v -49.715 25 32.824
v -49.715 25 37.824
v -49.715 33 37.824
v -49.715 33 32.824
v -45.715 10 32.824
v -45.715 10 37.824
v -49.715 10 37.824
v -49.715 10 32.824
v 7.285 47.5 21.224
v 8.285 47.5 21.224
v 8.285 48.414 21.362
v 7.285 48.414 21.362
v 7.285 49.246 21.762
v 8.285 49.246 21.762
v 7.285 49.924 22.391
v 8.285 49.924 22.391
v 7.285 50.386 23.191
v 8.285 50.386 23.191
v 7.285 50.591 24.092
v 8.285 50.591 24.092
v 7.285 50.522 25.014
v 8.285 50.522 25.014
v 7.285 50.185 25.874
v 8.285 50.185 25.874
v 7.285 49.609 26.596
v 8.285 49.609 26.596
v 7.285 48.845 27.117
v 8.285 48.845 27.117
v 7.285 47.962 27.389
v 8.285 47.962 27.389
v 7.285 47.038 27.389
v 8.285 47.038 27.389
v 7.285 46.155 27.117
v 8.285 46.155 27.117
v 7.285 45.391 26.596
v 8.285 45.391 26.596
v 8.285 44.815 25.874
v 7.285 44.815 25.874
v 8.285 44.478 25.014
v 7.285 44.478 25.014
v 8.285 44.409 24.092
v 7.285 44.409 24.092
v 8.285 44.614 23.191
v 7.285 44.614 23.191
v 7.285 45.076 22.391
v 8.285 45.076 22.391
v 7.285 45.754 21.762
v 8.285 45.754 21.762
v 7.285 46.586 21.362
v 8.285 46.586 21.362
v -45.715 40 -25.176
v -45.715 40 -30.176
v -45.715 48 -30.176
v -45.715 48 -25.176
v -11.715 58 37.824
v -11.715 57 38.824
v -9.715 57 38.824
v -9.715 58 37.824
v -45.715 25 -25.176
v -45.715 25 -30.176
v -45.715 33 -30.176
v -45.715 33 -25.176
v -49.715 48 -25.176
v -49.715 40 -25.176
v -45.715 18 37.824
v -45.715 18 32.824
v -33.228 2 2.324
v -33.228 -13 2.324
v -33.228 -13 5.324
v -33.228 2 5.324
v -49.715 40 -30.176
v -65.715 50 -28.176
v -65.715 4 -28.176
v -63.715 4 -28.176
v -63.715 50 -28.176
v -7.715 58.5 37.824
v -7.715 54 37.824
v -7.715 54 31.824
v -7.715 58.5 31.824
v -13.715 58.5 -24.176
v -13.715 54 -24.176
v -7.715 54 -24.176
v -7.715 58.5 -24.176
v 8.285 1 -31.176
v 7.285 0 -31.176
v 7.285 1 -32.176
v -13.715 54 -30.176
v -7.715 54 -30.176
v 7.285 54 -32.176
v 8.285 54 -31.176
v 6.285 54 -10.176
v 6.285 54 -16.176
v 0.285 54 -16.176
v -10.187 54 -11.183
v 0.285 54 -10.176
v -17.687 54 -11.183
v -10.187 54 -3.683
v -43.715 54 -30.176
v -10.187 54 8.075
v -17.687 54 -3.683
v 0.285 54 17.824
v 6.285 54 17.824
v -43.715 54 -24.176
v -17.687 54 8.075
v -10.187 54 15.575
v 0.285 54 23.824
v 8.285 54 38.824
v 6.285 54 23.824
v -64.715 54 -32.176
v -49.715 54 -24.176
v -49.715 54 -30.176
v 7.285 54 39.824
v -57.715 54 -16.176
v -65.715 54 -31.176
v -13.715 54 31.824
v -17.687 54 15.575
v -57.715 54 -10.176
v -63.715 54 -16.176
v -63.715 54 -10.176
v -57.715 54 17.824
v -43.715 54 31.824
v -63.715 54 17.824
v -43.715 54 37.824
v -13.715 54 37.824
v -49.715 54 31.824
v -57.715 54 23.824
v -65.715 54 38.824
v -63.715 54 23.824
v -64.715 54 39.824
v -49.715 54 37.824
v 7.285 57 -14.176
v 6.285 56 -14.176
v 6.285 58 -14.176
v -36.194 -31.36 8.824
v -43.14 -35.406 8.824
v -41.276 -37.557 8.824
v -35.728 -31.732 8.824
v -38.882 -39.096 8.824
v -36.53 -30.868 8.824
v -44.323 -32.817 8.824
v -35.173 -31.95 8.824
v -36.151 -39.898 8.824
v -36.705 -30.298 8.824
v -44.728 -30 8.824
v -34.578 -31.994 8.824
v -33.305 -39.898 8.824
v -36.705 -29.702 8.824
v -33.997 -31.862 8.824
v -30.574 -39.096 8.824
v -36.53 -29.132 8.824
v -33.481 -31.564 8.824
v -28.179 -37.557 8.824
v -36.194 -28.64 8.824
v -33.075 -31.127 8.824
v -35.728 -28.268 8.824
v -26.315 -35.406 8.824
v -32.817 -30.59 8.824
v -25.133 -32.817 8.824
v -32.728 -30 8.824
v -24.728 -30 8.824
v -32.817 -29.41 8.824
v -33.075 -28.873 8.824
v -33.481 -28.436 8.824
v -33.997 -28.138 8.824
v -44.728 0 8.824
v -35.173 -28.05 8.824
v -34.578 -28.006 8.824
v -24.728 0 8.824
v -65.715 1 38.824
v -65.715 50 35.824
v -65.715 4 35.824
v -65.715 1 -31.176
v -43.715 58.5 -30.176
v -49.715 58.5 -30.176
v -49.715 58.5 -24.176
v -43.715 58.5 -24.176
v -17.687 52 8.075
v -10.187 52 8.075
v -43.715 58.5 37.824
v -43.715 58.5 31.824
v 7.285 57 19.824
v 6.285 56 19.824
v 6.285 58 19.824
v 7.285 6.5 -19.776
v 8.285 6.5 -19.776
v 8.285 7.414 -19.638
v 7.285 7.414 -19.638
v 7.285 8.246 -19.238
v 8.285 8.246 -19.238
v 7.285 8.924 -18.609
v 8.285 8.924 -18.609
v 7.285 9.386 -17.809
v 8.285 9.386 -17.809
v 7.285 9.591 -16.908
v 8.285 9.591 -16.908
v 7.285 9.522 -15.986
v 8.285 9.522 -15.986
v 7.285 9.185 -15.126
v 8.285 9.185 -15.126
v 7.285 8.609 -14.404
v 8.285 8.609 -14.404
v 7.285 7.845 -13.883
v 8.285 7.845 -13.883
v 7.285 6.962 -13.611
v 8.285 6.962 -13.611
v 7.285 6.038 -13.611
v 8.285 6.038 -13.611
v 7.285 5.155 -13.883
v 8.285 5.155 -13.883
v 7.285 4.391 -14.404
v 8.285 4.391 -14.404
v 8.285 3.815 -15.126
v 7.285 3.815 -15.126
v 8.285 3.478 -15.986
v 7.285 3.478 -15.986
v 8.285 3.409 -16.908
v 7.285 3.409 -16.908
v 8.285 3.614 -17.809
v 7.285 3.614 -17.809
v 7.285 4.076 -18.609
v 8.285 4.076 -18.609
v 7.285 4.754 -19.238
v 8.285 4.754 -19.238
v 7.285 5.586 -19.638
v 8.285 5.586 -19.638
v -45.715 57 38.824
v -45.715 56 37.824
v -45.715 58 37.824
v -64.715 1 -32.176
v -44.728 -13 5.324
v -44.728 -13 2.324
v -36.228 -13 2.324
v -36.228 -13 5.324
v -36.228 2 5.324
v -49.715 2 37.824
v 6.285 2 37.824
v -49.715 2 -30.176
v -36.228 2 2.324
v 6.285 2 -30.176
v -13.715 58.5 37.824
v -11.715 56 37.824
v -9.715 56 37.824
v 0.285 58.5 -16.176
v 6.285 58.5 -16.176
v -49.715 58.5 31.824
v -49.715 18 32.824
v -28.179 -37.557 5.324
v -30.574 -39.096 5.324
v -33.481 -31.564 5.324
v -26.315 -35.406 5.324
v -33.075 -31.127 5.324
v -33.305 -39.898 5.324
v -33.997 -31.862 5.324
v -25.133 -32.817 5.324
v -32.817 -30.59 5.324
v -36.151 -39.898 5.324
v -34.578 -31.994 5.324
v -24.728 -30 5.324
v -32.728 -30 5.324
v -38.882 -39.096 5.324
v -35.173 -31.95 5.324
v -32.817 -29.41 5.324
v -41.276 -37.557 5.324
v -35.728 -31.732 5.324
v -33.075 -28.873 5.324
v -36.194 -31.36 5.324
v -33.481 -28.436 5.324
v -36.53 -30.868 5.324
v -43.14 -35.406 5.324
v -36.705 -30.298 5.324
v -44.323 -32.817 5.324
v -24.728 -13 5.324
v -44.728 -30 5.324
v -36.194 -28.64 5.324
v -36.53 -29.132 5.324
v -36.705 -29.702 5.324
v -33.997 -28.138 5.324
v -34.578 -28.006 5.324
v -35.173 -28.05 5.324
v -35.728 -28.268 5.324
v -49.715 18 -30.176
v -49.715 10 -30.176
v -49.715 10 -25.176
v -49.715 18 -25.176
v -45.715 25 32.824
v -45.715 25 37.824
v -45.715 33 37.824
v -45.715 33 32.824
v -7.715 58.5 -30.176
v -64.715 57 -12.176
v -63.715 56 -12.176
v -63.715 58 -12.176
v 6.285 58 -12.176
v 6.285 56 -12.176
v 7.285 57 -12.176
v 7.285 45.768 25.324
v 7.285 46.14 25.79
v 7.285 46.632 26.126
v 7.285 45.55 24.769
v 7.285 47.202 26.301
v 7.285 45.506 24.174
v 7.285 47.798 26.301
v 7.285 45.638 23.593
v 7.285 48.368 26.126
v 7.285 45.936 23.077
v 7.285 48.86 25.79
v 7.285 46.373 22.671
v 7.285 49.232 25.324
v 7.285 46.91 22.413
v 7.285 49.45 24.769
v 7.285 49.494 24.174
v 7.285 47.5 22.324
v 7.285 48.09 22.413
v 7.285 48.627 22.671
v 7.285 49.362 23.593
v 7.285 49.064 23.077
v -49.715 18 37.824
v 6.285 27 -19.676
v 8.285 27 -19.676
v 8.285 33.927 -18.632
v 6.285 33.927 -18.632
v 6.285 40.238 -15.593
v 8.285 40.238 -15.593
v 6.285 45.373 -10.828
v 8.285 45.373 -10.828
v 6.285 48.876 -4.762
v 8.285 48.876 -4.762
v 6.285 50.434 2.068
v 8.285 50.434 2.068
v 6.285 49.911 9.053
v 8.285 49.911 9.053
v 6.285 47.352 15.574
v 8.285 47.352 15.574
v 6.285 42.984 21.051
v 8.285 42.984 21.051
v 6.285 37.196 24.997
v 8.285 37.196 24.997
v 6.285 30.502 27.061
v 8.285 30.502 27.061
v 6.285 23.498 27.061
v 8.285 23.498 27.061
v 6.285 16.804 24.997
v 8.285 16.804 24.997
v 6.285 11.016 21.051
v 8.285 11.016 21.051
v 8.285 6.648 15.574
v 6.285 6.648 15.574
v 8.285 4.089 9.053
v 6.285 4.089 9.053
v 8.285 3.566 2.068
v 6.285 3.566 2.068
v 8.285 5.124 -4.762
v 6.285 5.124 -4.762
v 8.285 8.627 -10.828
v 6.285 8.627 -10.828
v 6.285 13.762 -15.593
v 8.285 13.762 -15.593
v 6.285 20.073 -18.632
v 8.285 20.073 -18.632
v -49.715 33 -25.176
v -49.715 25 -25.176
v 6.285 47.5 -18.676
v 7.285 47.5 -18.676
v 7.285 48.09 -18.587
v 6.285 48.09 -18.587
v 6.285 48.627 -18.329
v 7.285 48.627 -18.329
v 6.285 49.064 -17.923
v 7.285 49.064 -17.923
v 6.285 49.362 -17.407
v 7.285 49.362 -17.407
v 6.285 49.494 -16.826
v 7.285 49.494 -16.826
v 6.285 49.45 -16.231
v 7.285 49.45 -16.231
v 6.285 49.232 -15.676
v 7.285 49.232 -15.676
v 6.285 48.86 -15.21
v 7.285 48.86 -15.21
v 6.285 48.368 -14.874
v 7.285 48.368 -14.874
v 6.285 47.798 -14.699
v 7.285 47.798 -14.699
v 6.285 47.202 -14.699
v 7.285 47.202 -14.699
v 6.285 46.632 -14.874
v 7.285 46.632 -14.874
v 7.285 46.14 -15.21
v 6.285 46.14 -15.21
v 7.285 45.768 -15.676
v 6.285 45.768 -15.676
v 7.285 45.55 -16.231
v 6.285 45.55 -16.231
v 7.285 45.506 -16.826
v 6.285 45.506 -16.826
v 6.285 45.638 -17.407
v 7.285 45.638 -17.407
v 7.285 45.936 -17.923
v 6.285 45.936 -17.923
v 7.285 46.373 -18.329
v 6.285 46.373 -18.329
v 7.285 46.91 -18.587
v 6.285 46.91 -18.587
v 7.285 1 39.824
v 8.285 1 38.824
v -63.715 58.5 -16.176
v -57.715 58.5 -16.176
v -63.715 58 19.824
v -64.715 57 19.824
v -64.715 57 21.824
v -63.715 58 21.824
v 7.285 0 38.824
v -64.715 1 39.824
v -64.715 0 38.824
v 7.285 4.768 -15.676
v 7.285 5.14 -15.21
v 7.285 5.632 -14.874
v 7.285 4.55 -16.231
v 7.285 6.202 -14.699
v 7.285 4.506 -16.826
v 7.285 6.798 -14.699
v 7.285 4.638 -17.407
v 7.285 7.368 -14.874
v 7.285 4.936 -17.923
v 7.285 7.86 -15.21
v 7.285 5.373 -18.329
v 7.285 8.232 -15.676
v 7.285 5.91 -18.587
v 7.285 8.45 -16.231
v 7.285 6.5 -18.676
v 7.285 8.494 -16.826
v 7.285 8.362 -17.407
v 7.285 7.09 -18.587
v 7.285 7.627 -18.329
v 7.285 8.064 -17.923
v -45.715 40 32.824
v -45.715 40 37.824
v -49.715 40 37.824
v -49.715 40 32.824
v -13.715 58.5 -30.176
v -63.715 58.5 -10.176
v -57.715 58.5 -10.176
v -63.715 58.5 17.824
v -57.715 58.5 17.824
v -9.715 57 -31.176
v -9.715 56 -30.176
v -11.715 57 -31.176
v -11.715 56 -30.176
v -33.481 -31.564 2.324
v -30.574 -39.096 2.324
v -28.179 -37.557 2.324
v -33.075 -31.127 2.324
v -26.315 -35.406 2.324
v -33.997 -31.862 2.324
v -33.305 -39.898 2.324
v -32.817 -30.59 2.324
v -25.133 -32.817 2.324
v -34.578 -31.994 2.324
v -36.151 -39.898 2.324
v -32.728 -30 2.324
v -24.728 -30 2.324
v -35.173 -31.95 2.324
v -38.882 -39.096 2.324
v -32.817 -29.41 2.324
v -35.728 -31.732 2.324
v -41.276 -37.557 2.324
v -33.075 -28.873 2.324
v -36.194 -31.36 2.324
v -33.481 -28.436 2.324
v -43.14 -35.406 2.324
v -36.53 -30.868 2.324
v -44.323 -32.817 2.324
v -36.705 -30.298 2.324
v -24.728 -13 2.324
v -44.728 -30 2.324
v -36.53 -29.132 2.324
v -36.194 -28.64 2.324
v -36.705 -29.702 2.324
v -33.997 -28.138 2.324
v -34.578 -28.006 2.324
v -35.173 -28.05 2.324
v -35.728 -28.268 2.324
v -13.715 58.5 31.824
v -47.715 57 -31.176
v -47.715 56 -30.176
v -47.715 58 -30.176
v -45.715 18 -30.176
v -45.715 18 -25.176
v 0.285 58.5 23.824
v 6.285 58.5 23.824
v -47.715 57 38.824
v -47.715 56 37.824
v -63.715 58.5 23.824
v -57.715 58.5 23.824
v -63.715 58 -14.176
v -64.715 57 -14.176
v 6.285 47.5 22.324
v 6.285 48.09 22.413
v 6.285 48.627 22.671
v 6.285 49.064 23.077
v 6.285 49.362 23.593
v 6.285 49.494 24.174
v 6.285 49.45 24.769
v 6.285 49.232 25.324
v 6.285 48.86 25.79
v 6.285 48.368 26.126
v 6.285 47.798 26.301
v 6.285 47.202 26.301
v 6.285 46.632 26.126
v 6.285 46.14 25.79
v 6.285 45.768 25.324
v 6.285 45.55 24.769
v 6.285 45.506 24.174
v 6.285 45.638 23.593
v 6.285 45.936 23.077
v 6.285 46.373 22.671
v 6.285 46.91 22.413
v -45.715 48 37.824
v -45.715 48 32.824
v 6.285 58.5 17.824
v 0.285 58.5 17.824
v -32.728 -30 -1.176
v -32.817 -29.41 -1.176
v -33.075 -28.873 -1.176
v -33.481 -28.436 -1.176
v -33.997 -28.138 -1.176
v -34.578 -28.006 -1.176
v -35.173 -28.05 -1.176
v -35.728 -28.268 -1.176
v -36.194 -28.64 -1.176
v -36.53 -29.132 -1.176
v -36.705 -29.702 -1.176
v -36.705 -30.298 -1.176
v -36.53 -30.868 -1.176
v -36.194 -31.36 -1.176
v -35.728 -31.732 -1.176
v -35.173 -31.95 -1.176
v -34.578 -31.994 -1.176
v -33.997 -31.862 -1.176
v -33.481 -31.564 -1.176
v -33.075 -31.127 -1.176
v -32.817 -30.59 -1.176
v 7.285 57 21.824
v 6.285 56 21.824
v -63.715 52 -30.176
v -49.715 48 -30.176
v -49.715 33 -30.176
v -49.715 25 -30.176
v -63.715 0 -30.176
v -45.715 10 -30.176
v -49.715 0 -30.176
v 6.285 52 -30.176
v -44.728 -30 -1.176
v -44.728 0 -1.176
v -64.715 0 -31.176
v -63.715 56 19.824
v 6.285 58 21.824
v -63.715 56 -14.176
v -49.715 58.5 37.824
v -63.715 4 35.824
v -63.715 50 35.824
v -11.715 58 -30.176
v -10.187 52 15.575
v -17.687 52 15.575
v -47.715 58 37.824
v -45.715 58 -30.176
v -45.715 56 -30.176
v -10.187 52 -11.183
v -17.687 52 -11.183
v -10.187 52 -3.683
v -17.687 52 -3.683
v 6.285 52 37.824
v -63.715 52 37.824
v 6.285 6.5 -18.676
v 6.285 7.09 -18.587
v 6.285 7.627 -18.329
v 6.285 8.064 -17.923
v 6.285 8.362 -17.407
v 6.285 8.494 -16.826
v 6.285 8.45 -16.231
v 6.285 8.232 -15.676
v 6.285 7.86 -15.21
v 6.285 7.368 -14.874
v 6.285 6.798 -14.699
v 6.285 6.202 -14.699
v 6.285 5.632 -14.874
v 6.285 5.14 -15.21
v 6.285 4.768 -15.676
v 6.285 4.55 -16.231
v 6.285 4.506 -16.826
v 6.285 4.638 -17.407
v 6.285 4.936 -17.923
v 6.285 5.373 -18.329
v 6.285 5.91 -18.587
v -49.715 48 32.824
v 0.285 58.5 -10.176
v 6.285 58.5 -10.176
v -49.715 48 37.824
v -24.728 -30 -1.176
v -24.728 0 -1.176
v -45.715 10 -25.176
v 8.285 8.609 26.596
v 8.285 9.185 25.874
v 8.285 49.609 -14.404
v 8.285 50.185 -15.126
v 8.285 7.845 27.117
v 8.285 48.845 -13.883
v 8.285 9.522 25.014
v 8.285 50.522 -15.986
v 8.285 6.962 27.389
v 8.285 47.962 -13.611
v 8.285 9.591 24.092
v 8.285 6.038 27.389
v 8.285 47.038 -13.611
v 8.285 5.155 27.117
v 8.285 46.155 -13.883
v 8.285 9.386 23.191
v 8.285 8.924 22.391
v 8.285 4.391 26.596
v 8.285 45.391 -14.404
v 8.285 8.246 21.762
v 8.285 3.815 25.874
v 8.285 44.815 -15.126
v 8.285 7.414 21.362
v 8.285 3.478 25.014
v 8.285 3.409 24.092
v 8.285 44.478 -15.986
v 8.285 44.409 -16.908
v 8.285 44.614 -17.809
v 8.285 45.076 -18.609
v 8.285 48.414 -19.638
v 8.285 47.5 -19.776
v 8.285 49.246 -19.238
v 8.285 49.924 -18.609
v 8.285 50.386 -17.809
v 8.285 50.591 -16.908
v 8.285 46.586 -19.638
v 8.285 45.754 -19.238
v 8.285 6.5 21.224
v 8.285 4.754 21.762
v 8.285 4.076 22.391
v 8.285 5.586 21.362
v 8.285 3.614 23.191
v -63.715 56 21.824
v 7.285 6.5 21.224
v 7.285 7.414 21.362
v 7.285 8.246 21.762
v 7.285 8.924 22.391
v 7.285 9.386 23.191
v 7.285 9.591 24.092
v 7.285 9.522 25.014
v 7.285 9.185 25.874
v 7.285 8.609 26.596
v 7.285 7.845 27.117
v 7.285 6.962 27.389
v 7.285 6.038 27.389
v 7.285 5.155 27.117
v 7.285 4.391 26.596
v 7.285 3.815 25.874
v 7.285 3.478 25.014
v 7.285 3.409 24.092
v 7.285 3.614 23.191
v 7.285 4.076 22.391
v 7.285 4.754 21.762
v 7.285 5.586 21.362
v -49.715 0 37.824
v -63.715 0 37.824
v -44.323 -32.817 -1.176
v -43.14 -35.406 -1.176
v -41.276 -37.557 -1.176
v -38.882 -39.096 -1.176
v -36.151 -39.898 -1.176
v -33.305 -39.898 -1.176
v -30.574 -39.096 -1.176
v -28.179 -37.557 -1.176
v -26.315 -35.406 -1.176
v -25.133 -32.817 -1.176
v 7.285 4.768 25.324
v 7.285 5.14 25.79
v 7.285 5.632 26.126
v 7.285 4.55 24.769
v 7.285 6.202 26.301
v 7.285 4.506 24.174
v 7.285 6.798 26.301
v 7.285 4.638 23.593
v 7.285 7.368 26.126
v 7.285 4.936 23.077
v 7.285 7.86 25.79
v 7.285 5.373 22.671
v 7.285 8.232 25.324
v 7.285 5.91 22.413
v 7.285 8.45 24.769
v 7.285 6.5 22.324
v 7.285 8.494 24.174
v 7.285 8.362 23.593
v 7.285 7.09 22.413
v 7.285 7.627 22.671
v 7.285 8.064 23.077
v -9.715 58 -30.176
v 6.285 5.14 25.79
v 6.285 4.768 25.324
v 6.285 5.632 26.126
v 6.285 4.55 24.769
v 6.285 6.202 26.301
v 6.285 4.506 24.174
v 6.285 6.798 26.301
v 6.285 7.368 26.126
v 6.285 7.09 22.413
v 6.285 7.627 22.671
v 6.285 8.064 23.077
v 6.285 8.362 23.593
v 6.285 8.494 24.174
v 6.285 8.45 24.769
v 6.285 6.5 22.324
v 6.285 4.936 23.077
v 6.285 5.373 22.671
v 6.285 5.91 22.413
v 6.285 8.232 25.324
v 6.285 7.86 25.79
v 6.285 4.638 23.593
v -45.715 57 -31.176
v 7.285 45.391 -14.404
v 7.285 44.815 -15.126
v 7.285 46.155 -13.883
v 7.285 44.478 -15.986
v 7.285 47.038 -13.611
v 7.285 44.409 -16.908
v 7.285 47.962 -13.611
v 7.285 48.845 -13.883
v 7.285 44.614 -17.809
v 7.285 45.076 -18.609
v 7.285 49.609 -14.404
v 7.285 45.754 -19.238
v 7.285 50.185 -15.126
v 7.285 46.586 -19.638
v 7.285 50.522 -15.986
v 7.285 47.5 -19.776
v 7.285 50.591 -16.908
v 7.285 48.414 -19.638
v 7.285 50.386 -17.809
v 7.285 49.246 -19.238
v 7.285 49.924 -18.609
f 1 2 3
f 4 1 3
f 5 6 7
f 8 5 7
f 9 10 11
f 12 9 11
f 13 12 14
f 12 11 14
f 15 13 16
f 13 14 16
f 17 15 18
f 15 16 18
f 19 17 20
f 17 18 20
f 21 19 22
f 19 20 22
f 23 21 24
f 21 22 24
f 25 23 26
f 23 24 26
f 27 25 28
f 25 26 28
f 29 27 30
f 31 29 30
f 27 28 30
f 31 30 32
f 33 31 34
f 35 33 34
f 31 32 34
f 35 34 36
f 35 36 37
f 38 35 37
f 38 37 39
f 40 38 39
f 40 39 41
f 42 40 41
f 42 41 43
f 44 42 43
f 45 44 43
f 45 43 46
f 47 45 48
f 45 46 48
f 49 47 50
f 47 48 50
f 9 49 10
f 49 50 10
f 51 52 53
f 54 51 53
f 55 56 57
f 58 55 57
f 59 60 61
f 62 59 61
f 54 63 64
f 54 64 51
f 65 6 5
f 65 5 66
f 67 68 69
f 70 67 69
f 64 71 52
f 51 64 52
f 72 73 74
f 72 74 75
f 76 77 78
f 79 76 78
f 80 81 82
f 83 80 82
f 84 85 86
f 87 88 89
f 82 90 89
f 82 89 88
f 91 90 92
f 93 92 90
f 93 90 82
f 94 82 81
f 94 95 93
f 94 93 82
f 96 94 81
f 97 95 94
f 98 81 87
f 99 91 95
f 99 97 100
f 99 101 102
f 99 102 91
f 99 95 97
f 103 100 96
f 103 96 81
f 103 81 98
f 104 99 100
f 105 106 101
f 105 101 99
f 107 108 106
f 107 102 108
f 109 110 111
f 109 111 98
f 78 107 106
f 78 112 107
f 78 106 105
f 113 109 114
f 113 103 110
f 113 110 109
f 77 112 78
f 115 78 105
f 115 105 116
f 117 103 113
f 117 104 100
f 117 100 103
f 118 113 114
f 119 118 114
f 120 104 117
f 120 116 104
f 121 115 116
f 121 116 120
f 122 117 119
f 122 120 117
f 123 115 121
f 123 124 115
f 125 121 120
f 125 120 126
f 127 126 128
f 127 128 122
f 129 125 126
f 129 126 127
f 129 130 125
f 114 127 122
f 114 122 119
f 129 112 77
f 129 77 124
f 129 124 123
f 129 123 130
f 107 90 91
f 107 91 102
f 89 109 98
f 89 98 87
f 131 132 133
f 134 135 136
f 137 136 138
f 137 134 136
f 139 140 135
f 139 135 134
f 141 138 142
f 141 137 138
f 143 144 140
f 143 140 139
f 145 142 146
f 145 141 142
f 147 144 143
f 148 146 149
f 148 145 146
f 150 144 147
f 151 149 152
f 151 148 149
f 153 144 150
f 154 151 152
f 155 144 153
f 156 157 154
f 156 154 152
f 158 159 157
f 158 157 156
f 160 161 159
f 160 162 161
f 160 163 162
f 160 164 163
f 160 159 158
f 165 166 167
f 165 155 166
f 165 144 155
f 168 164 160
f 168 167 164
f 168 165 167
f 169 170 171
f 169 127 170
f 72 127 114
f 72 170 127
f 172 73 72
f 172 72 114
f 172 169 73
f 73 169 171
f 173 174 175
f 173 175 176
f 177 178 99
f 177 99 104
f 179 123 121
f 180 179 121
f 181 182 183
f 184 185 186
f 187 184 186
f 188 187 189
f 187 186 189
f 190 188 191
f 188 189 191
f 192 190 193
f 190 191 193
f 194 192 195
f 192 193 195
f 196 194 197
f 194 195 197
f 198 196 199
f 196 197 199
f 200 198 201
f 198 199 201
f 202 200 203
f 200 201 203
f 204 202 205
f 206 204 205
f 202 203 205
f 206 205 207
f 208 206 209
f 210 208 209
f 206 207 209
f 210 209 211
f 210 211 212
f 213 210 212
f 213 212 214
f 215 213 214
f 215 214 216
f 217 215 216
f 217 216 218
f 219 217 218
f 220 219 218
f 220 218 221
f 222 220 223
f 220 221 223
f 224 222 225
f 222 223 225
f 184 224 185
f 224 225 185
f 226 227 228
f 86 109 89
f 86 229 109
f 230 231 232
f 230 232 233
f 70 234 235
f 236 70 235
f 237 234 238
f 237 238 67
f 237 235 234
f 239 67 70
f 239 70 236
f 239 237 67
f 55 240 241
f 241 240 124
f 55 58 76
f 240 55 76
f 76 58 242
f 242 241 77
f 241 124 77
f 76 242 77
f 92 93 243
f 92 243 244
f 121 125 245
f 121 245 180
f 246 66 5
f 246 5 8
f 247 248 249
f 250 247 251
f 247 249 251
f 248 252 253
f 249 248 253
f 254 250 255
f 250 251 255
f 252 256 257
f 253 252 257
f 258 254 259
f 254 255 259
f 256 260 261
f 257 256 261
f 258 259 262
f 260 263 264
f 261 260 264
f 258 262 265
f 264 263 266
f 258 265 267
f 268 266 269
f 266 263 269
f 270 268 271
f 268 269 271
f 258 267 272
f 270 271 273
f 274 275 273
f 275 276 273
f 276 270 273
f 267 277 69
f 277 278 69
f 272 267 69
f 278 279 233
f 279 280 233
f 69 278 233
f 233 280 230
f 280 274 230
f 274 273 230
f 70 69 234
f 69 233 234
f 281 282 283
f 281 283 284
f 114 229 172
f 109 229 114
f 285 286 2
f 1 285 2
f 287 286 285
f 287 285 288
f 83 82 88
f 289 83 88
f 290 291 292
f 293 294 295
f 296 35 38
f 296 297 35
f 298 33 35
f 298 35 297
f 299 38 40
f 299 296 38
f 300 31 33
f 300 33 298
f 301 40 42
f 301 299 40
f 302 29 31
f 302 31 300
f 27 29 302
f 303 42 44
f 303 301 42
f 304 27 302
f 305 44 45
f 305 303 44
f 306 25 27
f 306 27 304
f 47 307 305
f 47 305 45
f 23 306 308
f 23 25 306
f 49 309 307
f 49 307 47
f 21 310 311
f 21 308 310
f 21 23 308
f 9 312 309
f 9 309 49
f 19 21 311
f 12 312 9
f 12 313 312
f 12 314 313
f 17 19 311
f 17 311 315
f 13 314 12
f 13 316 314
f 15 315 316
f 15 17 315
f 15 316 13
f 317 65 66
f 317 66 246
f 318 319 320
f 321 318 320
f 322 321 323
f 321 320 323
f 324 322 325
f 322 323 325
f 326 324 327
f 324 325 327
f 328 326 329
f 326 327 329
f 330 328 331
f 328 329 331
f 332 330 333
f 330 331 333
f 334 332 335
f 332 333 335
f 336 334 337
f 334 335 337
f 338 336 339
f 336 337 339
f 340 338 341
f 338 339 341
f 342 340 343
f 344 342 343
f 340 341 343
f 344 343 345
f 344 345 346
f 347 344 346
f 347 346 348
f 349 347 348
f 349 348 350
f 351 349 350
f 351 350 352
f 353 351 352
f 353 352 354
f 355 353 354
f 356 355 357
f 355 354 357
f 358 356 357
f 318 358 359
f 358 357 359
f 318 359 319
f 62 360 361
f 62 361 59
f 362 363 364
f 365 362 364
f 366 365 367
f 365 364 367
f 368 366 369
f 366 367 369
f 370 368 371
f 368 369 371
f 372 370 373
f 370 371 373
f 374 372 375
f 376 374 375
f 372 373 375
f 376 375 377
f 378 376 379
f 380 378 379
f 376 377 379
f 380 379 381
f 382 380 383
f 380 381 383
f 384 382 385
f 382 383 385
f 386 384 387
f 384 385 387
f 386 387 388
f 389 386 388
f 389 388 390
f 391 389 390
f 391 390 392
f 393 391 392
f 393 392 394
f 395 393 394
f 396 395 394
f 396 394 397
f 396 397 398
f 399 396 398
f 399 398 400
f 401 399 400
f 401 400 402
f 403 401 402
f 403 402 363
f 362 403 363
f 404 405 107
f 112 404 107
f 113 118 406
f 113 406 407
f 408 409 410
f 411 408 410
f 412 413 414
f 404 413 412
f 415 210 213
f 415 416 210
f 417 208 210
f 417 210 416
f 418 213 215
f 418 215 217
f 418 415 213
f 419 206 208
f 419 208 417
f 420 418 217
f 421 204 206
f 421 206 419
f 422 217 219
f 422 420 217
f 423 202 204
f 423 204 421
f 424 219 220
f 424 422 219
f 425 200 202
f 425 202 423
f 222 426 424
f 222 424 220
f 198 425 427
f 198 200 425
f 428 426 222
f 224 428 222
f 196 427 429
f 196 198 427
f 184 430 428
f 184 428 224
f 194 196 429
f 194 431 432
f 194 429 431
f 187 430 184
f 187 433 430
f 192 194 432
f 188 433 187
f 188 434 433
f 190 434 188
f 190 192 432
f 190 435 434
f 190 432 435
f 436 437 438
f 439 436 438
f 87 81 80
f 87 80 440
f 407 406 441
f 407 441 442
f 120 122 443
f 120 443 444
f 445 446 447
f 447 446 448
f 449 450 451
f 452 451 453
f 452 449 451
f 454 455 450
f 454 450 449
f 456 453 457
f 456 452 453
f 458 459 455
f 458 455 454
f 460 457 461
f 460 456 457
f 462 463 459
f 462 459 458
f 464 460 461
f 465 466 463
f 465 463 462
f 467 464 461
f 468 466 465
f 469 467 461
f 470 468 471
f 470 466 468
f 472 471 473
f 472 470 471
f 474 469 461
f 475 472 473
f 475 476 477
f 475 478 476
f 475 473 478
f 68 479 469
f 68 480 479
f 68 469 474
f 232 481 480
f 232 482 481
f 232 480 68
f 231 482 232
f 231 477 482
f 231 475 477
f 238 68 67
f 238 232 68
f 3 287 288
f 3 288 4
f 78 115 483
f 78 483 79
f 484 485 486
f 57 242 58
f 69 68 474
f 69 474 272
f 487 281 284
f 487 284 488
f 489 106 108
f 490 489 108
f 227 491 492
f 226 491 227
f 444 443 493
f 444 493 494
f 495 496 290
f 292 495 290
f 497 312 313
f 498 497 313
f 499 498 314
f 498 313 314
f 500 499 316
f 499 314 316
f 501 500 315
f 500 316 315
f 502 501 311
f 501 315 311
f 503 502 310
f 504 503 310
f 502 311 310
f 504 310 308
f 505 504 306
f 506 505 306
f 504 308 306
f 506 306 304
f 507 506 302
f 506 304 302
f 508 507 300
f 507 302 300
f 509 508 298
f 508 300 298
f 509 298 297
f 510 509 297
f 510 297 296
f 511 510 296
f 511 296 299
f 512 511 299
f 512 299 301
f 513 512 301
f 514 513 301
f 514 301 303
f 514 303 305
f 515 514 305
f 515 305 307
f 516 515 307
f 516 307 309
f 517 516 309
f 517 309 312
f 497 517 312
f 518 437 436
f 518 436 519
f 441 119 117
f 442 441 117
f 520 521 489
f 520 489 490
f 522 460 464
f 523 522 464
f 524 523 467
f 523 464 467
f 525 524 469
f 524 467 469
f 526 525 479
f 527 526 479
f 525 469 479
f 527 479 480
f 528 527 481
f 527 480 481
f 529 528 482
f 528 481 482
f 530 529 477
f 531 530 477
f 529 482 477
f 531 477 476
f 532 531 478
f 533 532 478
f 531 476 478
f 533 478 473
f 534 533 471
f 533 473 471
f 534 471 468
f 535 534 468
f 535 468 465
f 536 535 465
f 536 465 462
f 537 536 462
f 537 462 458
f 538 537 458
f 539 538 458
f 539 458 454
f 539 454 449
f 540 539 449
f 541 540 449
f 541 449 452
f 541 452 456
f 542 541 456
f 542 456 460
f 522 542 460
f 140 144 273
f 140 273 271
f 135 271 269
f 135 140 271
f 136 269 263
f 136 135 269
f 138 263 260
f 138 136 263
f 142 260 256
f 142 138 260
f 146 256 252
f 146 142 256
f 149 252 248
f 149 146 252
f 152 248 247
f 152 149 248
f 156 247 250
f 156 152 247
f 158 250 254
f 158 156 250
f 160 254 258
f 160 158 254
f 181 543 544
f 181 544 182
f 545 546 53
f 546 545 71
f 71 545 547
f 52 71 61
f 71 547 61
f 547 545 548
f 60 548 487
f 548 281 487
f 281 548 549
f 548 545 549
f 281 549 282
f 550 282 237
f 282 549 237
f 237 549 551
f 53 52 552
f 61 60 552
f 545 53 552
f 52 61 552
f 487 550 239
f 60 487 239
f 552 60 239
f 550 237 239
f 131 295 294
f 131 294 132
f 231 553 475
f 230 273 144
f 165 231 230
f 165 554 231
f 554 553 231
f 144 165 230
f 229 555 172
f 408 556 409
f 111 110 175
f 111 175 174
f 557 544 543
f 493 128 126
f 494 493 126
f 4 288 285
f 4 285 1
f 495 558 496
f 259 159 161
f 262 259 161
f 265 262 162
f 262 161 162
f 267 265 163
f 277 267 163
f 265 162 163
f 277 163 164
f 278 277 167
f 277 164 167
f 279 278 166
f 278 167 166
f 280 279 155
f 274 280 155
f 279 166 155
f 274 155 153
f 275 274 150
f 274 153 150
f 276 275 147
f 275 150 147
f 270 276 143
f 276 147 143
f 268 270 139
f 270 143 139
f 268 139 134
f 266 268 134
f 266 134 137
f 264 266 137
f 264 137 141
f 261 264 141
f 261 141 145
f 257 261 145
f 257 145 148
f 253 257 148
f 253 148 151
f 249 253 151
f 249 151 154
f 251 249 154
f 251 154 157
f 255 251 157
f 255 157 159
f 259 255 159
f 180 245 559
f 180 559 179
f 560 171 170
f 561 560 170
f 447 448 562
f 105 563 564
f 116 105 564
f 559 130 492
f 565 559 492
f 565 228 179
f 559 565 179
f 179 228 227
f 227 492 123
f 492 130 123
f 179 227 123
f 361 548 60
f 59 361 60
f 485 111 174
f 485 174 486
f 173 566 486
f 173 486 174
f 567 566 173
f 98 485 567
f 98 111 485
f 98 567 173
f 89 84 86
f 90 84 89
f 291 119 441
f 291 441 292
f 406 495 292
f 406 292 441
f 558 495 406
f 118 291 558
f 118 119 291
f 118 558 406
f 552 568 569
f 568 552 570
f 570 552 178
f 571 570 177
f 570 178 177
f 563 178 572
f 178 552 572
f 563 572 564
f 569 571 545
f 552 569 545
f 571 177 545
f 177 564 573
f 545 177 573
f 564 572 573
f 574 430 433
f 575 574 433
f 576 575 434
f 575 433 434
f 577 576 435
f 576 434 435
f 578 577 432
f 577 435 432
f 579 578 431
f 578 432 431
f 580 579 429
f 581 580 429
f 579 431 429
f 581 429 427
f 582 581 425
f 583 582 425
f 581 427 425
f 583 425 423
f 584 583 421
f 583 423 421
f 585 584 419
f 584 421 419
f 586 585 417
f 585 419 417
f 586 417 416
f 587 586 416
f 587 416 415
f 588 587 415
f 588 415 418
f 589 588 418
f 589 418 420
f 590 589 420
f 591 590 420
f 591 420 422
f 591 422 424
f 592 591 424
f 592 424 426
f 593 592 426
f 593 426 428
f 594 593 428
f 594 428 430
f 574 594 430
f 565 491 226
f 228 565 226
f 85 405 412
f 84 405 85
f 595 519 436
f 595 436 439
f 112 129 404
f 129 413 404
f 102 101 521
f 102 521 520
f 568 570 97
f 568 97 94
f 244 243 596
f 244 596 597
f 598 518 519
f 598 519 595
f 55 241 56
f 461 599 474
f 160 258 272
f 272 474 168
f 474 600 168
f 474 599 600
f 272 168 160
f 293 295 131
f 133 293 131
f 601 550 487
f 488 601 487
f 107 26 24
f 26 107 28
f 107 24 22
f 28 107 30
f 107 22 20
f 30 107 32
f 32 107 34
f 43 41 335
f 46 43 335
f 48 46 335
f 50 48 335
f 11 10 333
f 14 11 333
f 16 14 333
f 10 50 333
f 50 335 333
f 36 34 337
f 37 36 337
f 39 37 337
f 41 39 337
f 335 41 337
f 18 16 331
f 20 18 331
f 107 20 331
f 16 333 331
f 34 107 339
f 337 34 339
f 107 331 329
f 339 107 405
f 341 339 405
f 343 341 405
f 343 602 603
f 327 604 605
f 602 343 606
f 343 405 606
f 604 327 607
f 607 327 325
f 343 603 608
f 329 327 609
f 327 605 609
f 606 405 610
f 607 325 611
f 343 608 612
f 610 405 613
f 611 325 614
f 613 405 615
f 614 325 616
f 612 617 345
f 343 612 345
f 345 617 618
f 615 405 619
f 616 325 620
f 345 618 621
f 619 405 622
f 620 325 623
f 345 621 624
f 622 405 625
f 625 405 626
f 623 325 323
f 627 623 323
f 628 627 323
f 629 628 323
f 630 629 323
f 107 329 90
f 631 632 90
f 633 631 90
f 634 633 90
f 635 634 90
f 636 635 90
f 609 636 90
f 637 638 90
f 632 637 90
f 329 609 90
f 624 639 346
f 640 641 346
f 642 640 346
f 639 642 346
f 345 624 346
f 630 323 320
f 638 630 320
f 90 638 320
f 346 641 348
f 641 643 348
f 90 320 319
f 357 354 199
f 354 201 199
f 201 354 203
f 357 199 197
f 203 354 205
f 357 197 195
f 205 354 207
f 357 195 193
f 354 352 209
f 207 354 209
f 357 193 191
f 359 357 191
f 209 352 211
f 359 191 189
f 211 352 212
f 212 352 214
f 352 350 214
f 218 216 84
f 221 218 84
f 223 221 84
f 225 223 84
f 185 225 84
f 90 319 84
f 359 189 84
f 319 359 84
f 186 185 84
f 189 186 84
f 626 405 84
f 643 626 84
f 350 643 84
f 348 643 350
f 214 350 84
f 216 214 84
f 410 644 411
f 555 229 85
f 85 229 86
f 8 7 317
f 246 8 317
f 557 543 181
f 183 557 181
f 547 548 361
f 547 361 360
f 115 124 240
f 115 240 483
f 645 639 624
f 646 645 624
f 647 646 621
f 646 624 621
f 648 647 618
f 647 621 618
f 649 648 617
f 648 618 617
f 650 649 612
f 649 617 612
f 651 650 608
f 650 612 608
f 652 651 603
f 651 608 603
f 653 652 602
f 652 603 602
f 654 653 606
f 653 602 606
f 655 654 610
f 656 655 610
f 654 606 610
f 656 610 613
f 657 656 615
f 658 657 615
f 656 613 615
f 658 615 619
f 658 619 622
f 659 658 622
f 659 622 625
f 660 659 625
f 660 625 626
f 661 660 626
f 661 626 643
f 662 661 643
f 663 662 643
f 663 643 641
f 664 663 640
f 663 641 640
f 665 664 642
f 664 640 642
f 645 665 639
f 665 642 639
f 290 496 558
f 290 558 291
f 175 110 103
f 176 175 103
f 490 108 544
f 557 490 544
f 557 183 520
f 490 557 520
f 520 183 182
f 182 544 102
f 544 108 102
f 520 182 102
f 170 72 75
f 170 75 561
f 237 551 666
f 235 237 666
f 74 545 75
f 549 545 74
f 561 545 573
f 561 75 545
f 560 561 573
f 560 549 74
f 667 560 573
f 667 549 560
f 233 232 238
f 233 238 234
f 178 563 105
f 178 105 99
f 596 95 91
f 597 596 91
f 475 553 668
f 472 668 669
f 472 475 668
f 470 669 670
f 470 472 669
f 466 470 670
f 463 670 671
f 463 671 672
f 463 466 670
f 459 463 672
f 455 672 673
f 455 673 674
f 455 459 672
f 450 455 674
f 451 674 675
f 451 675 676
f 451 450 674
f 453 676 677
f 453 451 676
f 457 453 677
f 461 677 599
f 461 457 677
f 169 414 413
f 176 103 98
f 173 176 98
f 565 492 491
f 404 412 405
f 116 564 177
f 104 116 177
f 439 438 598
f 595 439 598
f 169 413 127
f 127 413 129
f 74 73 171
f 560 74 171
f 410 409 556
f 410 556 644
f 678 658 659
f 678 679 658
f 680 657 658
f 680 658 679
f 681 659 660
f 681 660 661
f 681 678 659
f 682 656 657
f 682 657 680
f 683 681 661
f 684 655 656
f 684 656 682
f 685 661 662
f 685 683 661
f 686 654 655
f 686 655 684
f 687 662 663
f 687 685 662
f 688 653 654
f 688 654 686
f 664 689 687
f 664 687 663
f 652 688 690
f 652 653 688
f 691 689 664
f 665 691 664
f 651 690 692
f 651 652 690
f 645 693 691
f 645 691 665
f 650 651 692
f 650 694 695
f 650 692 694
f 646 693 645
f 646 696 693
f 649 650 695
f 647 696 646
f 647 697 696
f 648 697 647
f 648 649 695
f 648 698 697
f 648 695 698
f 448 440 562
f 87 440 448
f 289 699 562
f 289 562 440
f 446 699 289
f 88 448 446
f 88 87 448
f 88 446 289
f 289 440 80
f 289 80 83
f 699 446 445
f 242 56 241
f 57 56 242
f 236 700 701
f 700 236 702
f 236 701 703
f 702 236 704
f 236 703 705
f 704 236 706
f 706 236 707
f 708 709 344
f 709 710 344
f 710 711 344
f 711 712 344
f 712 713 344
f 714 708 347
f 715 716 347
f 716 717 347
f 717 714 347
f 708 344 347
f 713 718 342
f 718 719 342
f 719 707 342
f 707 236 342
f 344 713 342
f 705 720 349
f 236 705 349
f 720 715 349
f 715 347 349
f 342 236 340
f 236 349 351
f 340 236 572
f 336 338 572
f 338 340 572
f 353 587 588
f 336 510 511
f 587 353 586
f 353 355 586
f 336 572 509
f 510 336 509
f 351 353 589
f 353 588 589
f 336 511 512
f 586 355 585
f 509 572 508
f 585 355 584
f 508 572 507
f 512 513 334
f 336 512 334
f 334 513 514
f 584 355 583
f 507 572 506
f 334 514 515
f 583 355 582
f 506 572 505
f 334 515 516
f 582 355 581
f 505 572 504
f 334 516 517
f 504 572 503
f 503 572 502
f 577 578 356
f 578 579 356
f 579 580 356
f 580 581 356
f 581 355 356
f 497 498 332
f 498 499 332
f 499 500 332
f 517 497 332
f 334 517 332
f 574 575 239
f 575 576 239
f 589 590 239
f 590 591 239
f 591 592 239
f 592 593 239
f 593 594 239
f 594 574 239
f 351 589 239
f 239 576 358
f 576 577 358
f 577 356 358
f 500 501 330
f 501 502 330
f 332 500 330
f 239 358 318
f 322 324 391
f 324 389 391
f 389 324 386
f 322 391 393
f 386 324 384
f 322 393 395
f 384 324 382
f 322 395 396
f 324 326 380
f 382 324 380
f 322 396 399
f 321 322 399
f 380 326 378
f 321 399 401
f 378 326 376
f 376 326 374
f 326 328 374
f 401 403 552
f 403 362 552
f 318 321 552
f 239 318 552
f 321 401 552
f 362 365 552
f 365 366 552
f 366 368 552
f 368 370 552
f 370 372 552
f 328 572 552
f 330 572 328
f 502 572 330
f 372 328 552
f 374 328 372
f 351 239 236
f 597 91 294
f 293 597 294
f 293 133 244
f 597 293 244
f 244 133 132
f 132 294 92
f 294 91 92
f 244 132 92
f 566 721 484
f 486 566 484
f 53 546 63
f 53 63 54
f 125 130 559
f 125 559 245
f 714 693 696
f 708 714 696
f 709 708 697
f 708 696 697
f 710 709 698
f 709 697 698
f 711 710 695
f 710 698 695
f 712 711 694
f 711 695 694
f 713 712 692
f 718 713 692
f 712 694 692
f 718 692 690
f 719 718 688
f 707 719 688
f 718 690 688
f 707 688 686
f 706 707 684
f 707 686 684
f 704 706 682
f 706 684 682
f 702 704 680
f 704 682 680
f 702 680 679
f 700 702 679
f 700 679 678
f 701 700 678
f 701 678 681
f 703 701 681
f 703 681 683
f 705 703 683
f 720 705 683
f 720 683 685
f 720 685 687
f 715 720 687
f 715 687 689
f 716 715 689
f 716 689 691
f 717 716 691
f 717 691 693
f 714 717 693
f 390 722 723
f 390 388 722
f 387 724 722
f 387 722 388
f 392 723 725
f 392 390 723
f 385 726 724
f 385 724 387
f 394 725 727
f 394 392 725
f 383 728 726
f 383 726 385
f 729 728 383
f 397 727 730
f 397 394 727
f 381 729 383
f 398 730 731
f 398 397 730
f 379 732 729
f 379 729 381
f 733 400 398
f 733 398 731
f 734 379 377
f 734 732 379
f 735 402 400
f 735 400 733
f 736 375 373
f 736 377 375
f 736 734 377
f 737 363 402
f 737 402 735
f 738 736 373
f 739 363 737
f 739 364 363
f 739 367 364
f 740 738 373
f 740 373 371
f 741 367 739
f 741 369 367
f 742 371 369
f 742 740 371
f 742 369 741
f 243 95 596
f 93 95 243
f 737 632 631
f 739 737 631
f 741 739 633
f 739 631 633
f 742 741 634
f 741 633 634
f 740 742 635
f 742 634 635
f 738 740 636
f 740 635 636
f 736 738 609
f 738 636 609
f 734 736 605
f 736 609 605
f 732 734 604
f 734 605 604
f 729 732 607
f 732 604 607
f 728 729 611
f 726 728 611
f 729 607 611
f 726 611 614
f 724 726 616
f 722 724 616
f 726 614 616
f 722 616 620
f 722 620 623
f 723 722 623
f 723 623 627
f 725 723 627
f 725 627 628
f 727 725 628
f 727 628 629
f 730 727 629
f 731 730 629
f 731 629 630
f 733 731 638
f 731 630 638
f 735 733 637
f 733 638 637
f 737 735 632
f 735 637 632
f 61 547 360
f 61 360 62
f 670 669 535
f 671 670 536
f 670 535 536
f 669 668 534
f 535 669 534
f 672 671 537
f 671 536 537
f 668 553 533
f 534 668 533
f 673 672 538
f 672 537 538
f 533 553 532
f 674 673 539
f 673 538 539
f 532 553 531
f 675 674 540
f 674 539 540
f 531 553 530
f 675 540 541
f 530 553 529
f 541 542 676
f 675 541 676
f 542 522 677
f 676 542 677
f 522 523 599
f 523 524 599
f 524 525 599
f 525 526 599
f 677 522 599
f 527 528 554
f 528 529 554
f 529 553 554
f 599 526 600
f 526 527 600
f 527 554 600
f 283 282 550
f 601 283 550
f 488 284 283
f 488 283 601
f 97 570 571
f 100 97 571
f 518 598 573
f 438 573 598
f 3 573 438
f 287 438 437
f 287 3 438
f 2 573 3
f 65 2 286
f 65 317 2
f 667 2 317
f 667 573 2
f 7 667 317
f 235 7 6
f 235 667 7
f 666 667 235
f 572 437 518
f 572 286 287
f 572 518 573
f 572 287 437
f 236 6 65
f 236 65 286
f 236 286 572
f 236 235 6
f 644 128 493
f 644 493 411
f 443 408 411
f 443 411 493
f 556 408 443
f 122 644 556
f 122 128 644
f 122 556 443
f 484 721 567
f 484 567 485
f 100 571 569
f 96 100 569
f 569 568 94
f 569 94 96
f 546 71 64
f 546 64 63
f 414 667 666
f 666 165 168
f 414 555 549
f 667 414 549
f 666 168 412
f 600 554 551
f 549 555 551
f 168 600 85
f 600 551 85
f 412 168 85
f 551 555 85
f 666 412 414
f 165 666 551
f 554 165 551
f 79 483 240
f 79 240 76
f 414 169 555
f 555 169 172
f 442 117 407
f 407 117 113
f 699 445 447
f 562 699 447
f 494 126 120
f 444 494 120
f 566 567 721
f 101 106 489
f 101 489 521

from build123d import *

# Parameters (mm, degrees)
SKETCH_1_W          = 74
SKETCH_1_H          = 72
EXTRUDE_1_DEPTH     = 54
SKETCH_2_W          = 70
SKETCH_2_H          = 68
CUT_EXTRUDE_1_DEPTH = 52
SKETCH_4_R          = 23.5
SKETCH_4_R_2        = 2
CUT_EXTRUDE_2_DEPTH = 2
SKETCH_5_W          = 14
SKETCH_5_H          = 68
CUT_EXTRUDE_3_DEPTH = 2
SKETCH_6_W          = 9
SKETCH_6_H          = 2
EXTRUDE_2_DEPTH     = 5
SKETCH_7_W          = 9
SKETCH_7_H          = 2
EXTRUDE_3_DEPTH     = 5
CUT_EXTRUDE_4_REACH = 101.89
SKETCH_9_W          = 64
SKETCH_9_H          = 46
SKETCH_10_W         = 4
SKETCH_10_H         = 8
EXTRUDE_5_DEPTH     = 5
SKETCH_11_W         = 4
SKETCH_11_H         = 8
EXTRUDE_6_DEPTH     = 5
SKETCH_15_W         = 70
SKETCH_15_H         = 68
EXTRUDE_7_DEPTH     = 2
SKETCH_16_W         = 6
SKETCH_16_H         = 6
EXTRUDE_8_DEPTH     = 4.5
SKETCH_17_W         = 2
SKETCH_17_H         = 2
EXTRUDE_9_DEPTH     = 1
SKETCH_18_W         = 2
SKETCH_18_H         = 2
EXTRUDE_10_DEPTH    = 1
SKETCH_19_W         = 2
SKETCH_19_H         = 2
EXTRUDE_11_DEPTH    = 1
SKETCH_20_W         = 2
SKETCH_20_H         = 2
EXTRUDE_12_DEPTH    = 1
CUT_EXTRUDE_5_REACH = 94.782
SKETCH_21_W         = 7.5
SKETCH_21_H         = 7.5
SKETCH_25_W         = 20
SKETCH_25_H         = 10
EXTRUDE_15_DEPTH    = 30
SKETCH_26_R         = 10
EXTRUDE_16_DEPTH    = 10
SKETCH_27_R         = 2
CUT_EXTRUDE_6_DEPTH = 10
CUT_EXTRUDE_7_REACH = 90.422
SKETCH_29_W         = 3
SKETCH_29_H         = 27
CUT_EXTRUDE_8_REACH = 106.96
SKETCH_30_W         = 3
SKETCH_30_H         = 3
CHAMFER_1_SIZE      = 1
CHAMFER_2_SIZE      = 1
SKETCH_31_R         = 3.1
CUT_EXTRUDE_9_DEPTH = 1
CHAMFER_3_SIZE      = 1


with BuildPart() as part:
    # 草图1 → 凸台-拉伸1 (new body)
    with BuildSketch(Plane(origin=(0, 0, 0), x_dir=(1, 0, 0), z_dir=(0, 1, 0))):
        with Locations((-28.715316709, -3.823796856)):
            Rectangle(SKETCH_1_W, SKETCH_1_H)
    extrude(amount=EXTRUDE_1_DEPTH)

    # 草图2 → 切除-拉伸1 (cut)
    with BuildSketch(Plane(origin=(0, 54, 0), x_dir=(1, 0, 0), z_dir=(0, 1, 0))):
        with Locations((-28.715316709, -3.823796856)):
            Rectangle(SKETCH_2_W, SKETCH_2_H)
    extrude(amount=-CUT_EXTRUDE_1_DEPTH, mode=Mode.SUBTRACT)

    # 草图4 → 切除-拉伸2 (cut)
    with BuildSketch(Plane(origin=(8.284683291, 0, 0), x_dir=(0, 0, -1), z_dir=(1, 0, 0))):
        with Locations((-3.823796856, 27)):
            Circle(SKETCH_4_R)
        with Locations((16.676203144, 6.5)):
            Circle(SKETCH_4_R_2)
        with Locations((-24.323796856, 47.5)):
            Circle(SKETCH_4_R_2)
        with Locations((-24.323796856, 6.5)):
            Circle(SKETCH_4_R_2)
        with Locations((16.676203144, 47.5)):
            Circle(SKETCH_4_R_2)
    extrude(amount=-CUT_EXTRUDE_2_DEPTH, mode=Mode.SUBTRACT)

    # 草图5 → 切除-拉伸3 (cut)
    with BuildSketch(Plane.XZ):
        with Locations((-56.715316709, 3.823796856)):
            Rectangle(SKETCH_5_W, SKETCH_5_H)
    extrude(amount=-CUT_EXTRUDE_3_DEPTH, mode=Mode.SUBTRACT)

    # 草图6 → 凸台-拉伸2 (add)
    with BuildSketch(Plane(origin=(0, 0, 37.823796856), x_dir=(-1, 0, 0), z_dir=(0, 0, -1))):
        with Locations((59.215316709, 53)):
            Rectangle(SKETCH_6_W, SKETCH_6_H)
    extrude(amount=EXTRUDE_2_DEPTH)

    # 草图7 → 凸台-拉伸3 (add)
    with BuildSketch(Plane.XY.offset(-30.176203144)):
        with Locations((-59.215316709, 53)):
            Rectangle(SKETCH_7_W, SKETCH_7_H)
    extrude(amount=EXTRUDE_3_DEPTH)

    # 草图9 → 切除-拉伸4 (cut, up to next)
    with BuildSketch(Plane.ZY.offset(65.715316709), mode=Mode.PRIVATE) as cut_extrude_4_sk1:
        with Locations((3.823796856, 27)):
            Rectangle(SKETCH_9_W, SKETCH_9_H)
    cut_extrude_4_tool1 = extrude(cut_extrude_4_sk1.sketch, amount=-CUT_EXTRUDE_4_REACH, mode=Mode.PRIVATE) & part.part
    add(cut_extrude_4_tool1.solids().sort_by_distance((-65.715317, 27, 3.823797))[0], mode=Mode.SUBTRACT)

    # 草图10 → 凸台-拉伸5 (add)
    with BuildSketch(Plane(origin=(0, 0, 37.823796856), x_dir=(-1, 0, 0), z_dir=(0, 0, -1))):
        with Locations((47.715316709, 14)):
            Rectangle(SKETCH_10_W, SKETCH_10_H)
        with Locations((47.715316709, 29)):
            Rectangle(SKETCH_10_W, SKETCH_10_H)
        with Locations((47.715316709, 44)):
            Rectangle(SKETCH_10_W, SKETCH_10_H)
    extrude(amount=EXTRUDE_5_DEPTH)

    # 草图11 → 凸台-拉伸6 (add)
    with BuildSketch(Plane.XY.offset(-30.176203144)):
        with Locations((-47.715316709, 14)):
            Rectangle(SKETCH_11_W, SKETCH_11_H)
        with Locations((-47.715316709, 29)):
            Rectangle(SKETCH_11_W, SKETCH_11_H)
        with Locations((-47.715316709, 44)):
            Rectangle(SKETCH_11_W, SKETCH_11_H)
    extrude(amount=EXTRUDE_6_DEPTH)

    # 草图15 → 凸台-拉伸7 (add)
    with BuildSketch(Plane(origin=(0, 54, 0), x_dir=(1, 0, 0), z_dir=(0, 1, 0))):
        with Locations((-28.715316709, -3.823796856)):
            Rectangle(SKETCH_15_W, SKETCH_15_H)
    extrude(amount=-EXTRUDE_7_DEPTH)

    # 草图16 → 凸台-拉伸8 (add)
    with BuildSketch(Plane(origin=(0, 54, 0), x_dir=(1, 0, 0), z_dir=(0, 1, 0))):
        with Locations((-46.715316709, -34.823796856)):
            Rectangle(SKETCH_16_W, SKETCH_16_H)
        with Locations((-60.715316709, 13.176203144)):
            Rectangle(SKETCH_16_W, SKETCH_16_H)
        with Locations((-10.715316709, -34.823796856)):
            Rectangle(SKETCH_16_W, SKETCH_16_H)
        with Locations((-46.715316709, 27.176203144)):
            Rectangle(SKETCH_16_W, SKETCH_16_H)
        with Locations((-10.715316709, 27.176203144)):
            Rectangle(SKETCH_16_W, SKETCH_16_H)
        with Locations((3.284683291, 13.176203144)):
            Rectangle(SKETCH_16_W, SKETCH_16_H)
        with Locations((3.284683291, -20.823796856)):
            Rectangle(SKETCH_16_W, SKETCH_16_H)
        with Locations((-60.715316709, -20.823796856)):
            Rectangle(SKETCH_16_W, SKETCH_16_H)
    extrude(amount=EXTRUDE_8_DEPTH)

    # 草图17 → 凸台-拉伸9 (add)
    with BuildSketch(Plane.ZY.offset(63.715316709)):
        with Locations((-13.176203144, 57)):
            Rectangle(SKETCH_17_W, SKETCH_17_H)
        with Locations((20.823796856, 57)):
            Rectangle(SKETCH_17_W, SKETCH_17_H)
    extrude(amount=EXTRUDE_9_DEPTH)

    # 草图18 → 凸台-拉伸10 (add)
    with BuildSketch(Plane.XY.offset(37.823796856)):
        with Locations((-10.715316709, 57)):
            Rectangle(SKETCH_18_W, SKETCH_18_H)
        with Locations((-46.715316709, 57)):
            Rectangle(SKETCH_18_W, SKETCH_18_H)
    extrude(amount=EXTRUDE_10_DEPTH)

    # 草图19 → 凸台-拉伸11 (add)
    with BuildSketch(Plane(origin=(6.284683291, 0, 0), x_dir=(0, 0, -1), z_dir=(1, 0, 0))):
        with Locations((13.176203144, 57)):
            Rectangle(SKETCH_19_W, SKETCH_19_H)
        with Locations((-20.823796856, 57)):
            Rectangle(SKETCH_19_W, SKETCH_19_H)
    extrude(amount=EXTRUDE_11_DEPTH)

    # 草图20 → 凸台-拉伸12 (add)
    with BuildSketch(Plane(origin=(0, 0, -30.176203144), x_dir=(-1, 0, 0), z_dir=(0, 0, -1))):
        with Locations((46.715316709, 57)):
            Rectangle(SKETCH_20_W, SKETCH_20_H)
        with Locations((10.715316709, 57)):
            Rectangle(SKETCH_20_W, SKETCH_20_H)
    extrude(amount=EXTRUDE_12_DEPTH)

    # 草图21 → 切除-拉伸5 (cut, up to next)
    with BuildSketch(Plane(origin=(0, 52, 0), x_dir=(-1, 0, 0), z_dir=(0, -1, 0)), mode=Mode.PRIVATE) as cut_extrude_5_sk1:
        with Locations((13.936875607, -11.824892758)):
            Rectangle(SKETCH_21_W, SKETCH_21_H)
    cut_extrude_5_tool1 = extrude(cut_extrude_5_sk1.sketch, amount=-CUT_EXTRUDE_5_REACH, mode=Mode.PRIVATE) & part.part
    # 草图21 → 切除-拉伸5 (cut, up to next)
    with BuildSketch(Plane(origin=(0, 52, 0), x_dir=(-1, 0, 0), z_dir=(0, -1, 0)), mode=Mode.PRIVATE) as cut_extrude_5_sk2:
        with Locations((13.936875607, 7.433232356)):
            Rectangle(SKETCH_21_W, SKETCH_21_H)
    cut_extrude_5_tool2 = extrude(cut_extrude_5_sk2.sketch, amount=-CUT_EXTRUDE_5_REACH, mode=Mode.PRIVATE) & part.part
    add(cut_extrude_5_tool1.solids().sort_by_distance((-13.936876, 52, 11.824893))[0], mode=Mode.SUBTRACT)
    add(cut_extrude_5_tool2.solids().sort_by_distance((-13.936876, 52, -7.433232))[0], mode=Mode.SUBTRACT)

    # 草图25 → 凸台-拉伸15 (add)
    with BuildSketch(Plane.XZ):
        with Locations((-34.727823945, 3.823796856)):
            Rectangle(SKETCH_25_W, SKETCH_25_H)
    extrude(amount=EXTRUDE_15_DEPTH)

    # 草图26 → 凸台-拉伸16 (add)
    with BuildSketch(Plane.XY.offset(8.823796856)):
        with Locations((-34.727823945, -30)):
            Circle(SKETCH_26_R)
    extrude(amount=-EXTRUDE_16_DEPTH)

    # 草图27 → 切除-拉伸6 (cut)
    with BuildSketch(Plane.XY.offset(8.823796856)):
        with Locations((-34.727823945, -30)):
            Circle(SKETCH_27_R)
    extrude(amount=-CUT_EXTRUDE_6_DEPTH, mode=Mode.SUBTRACT)

    # 草图29 → 切除-拉伸7 (cut, up to next)
    with BuildSketch(Plane.ZY.offset(44.727823945), mode=Mode.PRIVATE) as cut_extrude_7_sk1:
        with Locations((3.823796856, -26.5)):
            Rectangle(SKETCH_29_W, SKETCH_29_H)
    cut_extrude_7_tool1 = extrude(cut_extrude_7_sk1.sketch, amount=-CUT_EXTRUDE_7_REACH, mode=Mode.PRIVATE) & part.part
    add(cut_extrude_7_tool1.solids().sort_by_distance((-44.727824, -26.5, 3.823797))[0], mode=Mode.SUBTRACT)

    # 草图30 → 切除-拉伸8 (cut, up to next)
    with BuildSketch(Plane.XZ.offset(13), mode=Mode.PRIVATE) as cut_extrude_8_sk1:
        with Locations((-34.727823945, 3.823796856)):
            Rectangle(SKETCH_30_W, SKETCH_30_H)
    cut_extrude_8_tool1 = extrude(cut_extrude_8_sk1.sketch, amount=-CUT_EXTRUDE_8_REACH, mode=Mode.PRIVATE) & part.part
    add(cut_extrude_8_tool1.solids().sort_by_distance((-34.727824, -13, 3.823797))[0], mode=Mode.SUBTRACT)

    # 倒角1
    chamfer_1_edges = [part.edges().sort_by_distance(p)[0] for p in [
        (-28.715316709, 0, -32.176203144),
        (8.284683291, 0, 3.823796856),
        (-28.715316709, 0, 39.823796856),
        (-65.715316709, 0, 3.823796856),
        (-65.715316709, 27, -32.176203144),
        (8.284683291, 27, -32.176203144),
        (8.284683291, 27, 39.823796856),
        (-65.715316709, 27, 39.823796856),
    ]]
    chamfer(chamfer_1_edges, length=CHAMFER_1_SIZE)

    # 倒角2
    chamfer_2_edges = [part.edges().sort_by_distance(p)[0] for p in [
        (7.284683291, 58, 20.823796856),
        (7.284683291, 58, -13.176203144),
        (-10.715316709, 58, -31.176203144),
        (-46.715316709, 58, -31.176203144),
        (-64.715316709, 58, -13.176203144),
        (-64.715316709, 58, 20.823796856),
        (-10.715316709, 58, 38.823796856),
        (-46.715316709, 58, 38.823796856),
    ]]
    chamfer(chamfer_2_edges, length=CHAMFER_2_SIZE - 0.0001)  # a hair under: the kernel refuses the full size

    # 草图31 → 切除-拉伸9 (cut)
    with BuildSketch(Plane(origin=(8.284683291, 0, 0), x_dir=(0, 0, -1), z_dir=(1, 0, 0))):
        with Locations((16.676203144, 6.5)):
            Circle(SKETCH_31_R)
        with Locations((-24.323796856, 6.5)):
            Circle(SKETCH_31_R)
        with Locations((-24.323796856, 47.5)):
            Circle(SKETCH_31_R)
        with Locations((16.676203144, 47.5)):
            Circle(SKETCH_31_R)
    extrude(amount=-CUT_EXTRUDE_9_DEPTH, mode=Mode.SUBTRACT)

    # 倒角3
    chamfer_3_edges = [part.edges().sort_by_distance(p)[0] for p in [
        (-64.715316709, 56, 20.823796856),
        (-64.715316709, 56, -13.176203144),
        (-46.715316709, 56, -31.176203144),
        (-10.715316709, 56, -31.176203144),
        (7.284683291, 56, -13.176203144),
        (7.284683291, 56, 20.823796856),
        (-46.715316709, 56, 38.823796856),
        (-10.715316709, 56, 38.823796856),
    ]]
    chamfer(chamfer_3_edges, length=CHAMFER_3_SIZE - 0.0001)  # a hair under: the kernel refuses the full size


solid = part.part
